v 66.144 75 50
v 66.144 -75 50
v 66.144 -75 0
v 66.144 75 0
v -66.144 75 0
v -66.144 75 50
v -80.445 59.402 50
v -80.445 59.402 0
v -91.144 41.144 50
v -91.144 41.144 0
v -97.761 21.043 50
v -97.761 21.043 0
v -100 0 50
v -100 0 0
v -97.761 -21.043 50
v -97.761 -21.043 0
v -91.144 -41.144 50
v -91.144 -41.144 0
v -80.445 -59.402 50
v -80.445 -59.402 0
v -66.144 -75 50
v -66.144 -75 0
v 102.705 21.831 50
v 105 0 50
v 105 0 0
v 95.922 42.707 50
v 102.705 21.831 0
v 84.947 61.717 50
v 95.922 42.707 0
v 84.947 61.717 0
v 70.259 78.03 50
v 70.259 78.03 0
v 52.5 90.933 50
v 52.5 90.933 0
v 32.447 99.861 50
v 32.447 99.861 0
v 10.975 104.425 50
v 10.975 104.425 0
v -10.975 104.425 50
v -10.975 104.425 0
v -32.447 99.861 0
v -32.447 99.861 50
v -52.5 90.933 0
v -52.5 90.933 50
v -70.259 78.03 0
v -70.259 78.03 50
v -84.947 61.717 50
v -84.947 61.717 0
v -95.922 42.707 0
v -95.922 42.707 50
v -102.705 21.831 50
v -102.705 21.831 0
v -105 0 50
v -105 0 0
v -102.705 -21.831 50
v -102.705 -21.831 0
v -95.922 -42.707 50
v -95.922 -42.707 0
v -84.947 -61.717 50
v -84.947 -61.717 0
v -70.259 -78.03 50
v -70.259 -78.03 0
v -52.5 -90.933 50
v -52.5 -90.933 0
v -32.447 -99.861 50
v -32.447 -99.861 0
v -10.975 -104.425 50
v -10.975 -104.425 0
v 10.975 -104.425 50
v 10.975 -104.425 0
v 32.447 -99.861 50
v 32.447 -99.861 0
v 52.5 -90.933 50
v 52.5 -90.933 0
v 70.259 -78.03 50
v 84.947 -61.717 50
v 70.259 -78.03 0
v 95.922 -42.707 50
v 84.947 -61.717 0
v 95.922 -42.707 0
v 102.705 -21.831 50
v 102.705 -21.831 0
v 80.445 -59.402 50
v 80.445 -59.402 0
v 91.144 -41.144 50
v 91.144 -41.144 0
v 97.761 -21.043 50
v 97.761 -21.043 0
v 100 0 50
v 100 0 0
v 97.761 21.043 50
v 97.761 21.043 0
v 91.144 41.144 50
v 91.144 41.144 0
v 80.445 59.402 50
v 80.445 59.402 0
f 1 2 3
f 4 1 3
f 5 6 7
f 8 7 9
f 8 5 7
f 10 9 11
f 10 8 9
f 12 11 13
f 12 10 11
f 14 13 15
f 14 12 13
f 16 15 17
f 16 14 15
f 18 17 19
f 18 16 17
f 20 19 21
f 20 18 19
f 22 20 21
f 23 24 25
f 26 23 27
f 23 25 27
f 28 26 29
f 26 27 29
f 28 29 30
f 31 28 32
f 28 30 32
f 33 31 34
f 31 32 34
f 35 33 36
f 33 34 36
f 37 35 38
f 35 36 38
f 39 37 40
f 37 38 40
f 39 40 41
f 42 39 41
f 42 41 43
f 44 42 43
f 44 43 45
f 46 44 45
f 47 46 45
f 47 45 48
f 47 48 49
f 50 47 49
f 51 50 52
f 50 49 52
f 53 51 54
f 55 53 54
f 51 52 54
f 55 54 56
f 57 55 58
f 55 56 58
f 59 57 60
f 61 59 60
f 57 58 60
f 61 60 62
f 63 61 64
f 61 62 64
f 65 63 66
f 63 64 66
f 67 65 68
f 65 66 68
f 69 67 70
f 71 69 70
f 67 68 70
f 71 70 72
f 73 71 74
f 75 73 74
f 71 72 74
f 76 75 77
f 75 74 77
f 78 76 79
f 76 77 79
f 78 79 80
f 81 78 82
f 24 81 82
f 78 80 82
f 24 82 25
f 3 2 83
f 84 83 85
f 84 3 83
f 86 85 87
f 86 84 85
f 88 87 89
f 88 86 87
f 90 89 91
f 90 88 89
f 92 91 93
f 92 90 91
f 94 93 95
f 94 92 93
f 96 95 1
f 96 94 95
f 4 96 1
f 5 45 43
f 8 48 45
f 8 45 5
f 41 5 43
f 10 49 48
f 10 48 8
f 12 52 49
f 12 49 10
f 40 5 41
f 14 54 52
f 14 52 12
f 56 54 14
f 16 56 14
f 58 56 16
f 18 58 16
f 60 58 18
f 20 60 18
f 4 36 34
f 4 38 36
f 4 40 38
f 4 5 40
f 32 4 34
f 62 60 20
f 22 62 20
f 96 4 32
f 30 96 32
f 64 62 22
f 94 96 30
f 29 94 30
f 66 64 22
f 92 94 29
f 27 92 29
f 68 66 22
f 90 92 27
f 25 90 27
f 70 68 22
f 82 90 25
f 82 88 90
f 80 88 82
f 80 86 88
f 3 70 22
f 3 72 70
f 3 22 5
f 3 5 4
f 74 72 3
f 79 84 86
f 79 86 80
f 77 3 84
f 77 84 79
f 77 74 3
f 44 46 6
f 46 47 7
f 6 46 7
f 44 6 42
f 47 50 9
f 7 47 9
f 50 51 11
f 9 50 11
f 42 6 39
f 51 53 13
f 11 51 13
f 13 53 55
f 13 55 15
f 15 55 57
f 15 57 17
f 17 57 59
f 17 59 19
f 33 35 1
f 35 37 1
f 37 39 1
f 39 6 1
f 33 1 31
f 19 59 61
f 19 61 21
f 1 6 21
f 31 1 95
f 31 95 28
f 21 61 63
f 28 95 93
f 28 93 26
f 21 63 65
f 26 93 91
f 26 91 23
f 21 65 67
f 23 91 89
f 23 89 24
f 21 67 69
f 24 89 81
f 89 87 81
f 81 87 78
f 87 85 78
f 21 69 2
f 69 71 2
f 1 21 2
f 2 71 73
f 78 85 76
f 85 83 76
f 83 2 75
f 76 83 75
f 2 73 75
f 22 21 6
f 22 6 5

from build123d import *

# Parameters (mm, degrees)
F0_R      = 105
F0_R_2    = 100
F1_DEPTH  = 50
F3_W      = 132.2875655532
F3_H      = 50
F4_FACE_W = 132.2875655532
F4_FACE_H = 50


with BuildPart() as f1:
    # F0 (on Top) → F1 (new body)
    with BuildSketch(Plane.XY):
        Circle(F0_R)
        Circle(F0_R_2, mode=Mode.SUBTRACT)
    extrude(amount=F1_DEPTH)

    # F3 (on offset) → F4 (join, up to the next surface of F1)
    with BuildSketch(Plane.XZ.offset(75)):
        with Locations((0, 25)):
            Rectangle(F3_W, F3_H)
    extrude(until=Until.NEXT)

    # F4_face (on face) → F5 (join, up to the next surface of F1)
    with BuildSketch(Plane(origin=(0, -75, 25), x_dir=(1, 0, 0), z_dir=(0, 1, 0))):
        Rectangle(F4_FACE_W, F4_FACE_H)
    extrude(until=Until.NEXT)


solid = f1.part
